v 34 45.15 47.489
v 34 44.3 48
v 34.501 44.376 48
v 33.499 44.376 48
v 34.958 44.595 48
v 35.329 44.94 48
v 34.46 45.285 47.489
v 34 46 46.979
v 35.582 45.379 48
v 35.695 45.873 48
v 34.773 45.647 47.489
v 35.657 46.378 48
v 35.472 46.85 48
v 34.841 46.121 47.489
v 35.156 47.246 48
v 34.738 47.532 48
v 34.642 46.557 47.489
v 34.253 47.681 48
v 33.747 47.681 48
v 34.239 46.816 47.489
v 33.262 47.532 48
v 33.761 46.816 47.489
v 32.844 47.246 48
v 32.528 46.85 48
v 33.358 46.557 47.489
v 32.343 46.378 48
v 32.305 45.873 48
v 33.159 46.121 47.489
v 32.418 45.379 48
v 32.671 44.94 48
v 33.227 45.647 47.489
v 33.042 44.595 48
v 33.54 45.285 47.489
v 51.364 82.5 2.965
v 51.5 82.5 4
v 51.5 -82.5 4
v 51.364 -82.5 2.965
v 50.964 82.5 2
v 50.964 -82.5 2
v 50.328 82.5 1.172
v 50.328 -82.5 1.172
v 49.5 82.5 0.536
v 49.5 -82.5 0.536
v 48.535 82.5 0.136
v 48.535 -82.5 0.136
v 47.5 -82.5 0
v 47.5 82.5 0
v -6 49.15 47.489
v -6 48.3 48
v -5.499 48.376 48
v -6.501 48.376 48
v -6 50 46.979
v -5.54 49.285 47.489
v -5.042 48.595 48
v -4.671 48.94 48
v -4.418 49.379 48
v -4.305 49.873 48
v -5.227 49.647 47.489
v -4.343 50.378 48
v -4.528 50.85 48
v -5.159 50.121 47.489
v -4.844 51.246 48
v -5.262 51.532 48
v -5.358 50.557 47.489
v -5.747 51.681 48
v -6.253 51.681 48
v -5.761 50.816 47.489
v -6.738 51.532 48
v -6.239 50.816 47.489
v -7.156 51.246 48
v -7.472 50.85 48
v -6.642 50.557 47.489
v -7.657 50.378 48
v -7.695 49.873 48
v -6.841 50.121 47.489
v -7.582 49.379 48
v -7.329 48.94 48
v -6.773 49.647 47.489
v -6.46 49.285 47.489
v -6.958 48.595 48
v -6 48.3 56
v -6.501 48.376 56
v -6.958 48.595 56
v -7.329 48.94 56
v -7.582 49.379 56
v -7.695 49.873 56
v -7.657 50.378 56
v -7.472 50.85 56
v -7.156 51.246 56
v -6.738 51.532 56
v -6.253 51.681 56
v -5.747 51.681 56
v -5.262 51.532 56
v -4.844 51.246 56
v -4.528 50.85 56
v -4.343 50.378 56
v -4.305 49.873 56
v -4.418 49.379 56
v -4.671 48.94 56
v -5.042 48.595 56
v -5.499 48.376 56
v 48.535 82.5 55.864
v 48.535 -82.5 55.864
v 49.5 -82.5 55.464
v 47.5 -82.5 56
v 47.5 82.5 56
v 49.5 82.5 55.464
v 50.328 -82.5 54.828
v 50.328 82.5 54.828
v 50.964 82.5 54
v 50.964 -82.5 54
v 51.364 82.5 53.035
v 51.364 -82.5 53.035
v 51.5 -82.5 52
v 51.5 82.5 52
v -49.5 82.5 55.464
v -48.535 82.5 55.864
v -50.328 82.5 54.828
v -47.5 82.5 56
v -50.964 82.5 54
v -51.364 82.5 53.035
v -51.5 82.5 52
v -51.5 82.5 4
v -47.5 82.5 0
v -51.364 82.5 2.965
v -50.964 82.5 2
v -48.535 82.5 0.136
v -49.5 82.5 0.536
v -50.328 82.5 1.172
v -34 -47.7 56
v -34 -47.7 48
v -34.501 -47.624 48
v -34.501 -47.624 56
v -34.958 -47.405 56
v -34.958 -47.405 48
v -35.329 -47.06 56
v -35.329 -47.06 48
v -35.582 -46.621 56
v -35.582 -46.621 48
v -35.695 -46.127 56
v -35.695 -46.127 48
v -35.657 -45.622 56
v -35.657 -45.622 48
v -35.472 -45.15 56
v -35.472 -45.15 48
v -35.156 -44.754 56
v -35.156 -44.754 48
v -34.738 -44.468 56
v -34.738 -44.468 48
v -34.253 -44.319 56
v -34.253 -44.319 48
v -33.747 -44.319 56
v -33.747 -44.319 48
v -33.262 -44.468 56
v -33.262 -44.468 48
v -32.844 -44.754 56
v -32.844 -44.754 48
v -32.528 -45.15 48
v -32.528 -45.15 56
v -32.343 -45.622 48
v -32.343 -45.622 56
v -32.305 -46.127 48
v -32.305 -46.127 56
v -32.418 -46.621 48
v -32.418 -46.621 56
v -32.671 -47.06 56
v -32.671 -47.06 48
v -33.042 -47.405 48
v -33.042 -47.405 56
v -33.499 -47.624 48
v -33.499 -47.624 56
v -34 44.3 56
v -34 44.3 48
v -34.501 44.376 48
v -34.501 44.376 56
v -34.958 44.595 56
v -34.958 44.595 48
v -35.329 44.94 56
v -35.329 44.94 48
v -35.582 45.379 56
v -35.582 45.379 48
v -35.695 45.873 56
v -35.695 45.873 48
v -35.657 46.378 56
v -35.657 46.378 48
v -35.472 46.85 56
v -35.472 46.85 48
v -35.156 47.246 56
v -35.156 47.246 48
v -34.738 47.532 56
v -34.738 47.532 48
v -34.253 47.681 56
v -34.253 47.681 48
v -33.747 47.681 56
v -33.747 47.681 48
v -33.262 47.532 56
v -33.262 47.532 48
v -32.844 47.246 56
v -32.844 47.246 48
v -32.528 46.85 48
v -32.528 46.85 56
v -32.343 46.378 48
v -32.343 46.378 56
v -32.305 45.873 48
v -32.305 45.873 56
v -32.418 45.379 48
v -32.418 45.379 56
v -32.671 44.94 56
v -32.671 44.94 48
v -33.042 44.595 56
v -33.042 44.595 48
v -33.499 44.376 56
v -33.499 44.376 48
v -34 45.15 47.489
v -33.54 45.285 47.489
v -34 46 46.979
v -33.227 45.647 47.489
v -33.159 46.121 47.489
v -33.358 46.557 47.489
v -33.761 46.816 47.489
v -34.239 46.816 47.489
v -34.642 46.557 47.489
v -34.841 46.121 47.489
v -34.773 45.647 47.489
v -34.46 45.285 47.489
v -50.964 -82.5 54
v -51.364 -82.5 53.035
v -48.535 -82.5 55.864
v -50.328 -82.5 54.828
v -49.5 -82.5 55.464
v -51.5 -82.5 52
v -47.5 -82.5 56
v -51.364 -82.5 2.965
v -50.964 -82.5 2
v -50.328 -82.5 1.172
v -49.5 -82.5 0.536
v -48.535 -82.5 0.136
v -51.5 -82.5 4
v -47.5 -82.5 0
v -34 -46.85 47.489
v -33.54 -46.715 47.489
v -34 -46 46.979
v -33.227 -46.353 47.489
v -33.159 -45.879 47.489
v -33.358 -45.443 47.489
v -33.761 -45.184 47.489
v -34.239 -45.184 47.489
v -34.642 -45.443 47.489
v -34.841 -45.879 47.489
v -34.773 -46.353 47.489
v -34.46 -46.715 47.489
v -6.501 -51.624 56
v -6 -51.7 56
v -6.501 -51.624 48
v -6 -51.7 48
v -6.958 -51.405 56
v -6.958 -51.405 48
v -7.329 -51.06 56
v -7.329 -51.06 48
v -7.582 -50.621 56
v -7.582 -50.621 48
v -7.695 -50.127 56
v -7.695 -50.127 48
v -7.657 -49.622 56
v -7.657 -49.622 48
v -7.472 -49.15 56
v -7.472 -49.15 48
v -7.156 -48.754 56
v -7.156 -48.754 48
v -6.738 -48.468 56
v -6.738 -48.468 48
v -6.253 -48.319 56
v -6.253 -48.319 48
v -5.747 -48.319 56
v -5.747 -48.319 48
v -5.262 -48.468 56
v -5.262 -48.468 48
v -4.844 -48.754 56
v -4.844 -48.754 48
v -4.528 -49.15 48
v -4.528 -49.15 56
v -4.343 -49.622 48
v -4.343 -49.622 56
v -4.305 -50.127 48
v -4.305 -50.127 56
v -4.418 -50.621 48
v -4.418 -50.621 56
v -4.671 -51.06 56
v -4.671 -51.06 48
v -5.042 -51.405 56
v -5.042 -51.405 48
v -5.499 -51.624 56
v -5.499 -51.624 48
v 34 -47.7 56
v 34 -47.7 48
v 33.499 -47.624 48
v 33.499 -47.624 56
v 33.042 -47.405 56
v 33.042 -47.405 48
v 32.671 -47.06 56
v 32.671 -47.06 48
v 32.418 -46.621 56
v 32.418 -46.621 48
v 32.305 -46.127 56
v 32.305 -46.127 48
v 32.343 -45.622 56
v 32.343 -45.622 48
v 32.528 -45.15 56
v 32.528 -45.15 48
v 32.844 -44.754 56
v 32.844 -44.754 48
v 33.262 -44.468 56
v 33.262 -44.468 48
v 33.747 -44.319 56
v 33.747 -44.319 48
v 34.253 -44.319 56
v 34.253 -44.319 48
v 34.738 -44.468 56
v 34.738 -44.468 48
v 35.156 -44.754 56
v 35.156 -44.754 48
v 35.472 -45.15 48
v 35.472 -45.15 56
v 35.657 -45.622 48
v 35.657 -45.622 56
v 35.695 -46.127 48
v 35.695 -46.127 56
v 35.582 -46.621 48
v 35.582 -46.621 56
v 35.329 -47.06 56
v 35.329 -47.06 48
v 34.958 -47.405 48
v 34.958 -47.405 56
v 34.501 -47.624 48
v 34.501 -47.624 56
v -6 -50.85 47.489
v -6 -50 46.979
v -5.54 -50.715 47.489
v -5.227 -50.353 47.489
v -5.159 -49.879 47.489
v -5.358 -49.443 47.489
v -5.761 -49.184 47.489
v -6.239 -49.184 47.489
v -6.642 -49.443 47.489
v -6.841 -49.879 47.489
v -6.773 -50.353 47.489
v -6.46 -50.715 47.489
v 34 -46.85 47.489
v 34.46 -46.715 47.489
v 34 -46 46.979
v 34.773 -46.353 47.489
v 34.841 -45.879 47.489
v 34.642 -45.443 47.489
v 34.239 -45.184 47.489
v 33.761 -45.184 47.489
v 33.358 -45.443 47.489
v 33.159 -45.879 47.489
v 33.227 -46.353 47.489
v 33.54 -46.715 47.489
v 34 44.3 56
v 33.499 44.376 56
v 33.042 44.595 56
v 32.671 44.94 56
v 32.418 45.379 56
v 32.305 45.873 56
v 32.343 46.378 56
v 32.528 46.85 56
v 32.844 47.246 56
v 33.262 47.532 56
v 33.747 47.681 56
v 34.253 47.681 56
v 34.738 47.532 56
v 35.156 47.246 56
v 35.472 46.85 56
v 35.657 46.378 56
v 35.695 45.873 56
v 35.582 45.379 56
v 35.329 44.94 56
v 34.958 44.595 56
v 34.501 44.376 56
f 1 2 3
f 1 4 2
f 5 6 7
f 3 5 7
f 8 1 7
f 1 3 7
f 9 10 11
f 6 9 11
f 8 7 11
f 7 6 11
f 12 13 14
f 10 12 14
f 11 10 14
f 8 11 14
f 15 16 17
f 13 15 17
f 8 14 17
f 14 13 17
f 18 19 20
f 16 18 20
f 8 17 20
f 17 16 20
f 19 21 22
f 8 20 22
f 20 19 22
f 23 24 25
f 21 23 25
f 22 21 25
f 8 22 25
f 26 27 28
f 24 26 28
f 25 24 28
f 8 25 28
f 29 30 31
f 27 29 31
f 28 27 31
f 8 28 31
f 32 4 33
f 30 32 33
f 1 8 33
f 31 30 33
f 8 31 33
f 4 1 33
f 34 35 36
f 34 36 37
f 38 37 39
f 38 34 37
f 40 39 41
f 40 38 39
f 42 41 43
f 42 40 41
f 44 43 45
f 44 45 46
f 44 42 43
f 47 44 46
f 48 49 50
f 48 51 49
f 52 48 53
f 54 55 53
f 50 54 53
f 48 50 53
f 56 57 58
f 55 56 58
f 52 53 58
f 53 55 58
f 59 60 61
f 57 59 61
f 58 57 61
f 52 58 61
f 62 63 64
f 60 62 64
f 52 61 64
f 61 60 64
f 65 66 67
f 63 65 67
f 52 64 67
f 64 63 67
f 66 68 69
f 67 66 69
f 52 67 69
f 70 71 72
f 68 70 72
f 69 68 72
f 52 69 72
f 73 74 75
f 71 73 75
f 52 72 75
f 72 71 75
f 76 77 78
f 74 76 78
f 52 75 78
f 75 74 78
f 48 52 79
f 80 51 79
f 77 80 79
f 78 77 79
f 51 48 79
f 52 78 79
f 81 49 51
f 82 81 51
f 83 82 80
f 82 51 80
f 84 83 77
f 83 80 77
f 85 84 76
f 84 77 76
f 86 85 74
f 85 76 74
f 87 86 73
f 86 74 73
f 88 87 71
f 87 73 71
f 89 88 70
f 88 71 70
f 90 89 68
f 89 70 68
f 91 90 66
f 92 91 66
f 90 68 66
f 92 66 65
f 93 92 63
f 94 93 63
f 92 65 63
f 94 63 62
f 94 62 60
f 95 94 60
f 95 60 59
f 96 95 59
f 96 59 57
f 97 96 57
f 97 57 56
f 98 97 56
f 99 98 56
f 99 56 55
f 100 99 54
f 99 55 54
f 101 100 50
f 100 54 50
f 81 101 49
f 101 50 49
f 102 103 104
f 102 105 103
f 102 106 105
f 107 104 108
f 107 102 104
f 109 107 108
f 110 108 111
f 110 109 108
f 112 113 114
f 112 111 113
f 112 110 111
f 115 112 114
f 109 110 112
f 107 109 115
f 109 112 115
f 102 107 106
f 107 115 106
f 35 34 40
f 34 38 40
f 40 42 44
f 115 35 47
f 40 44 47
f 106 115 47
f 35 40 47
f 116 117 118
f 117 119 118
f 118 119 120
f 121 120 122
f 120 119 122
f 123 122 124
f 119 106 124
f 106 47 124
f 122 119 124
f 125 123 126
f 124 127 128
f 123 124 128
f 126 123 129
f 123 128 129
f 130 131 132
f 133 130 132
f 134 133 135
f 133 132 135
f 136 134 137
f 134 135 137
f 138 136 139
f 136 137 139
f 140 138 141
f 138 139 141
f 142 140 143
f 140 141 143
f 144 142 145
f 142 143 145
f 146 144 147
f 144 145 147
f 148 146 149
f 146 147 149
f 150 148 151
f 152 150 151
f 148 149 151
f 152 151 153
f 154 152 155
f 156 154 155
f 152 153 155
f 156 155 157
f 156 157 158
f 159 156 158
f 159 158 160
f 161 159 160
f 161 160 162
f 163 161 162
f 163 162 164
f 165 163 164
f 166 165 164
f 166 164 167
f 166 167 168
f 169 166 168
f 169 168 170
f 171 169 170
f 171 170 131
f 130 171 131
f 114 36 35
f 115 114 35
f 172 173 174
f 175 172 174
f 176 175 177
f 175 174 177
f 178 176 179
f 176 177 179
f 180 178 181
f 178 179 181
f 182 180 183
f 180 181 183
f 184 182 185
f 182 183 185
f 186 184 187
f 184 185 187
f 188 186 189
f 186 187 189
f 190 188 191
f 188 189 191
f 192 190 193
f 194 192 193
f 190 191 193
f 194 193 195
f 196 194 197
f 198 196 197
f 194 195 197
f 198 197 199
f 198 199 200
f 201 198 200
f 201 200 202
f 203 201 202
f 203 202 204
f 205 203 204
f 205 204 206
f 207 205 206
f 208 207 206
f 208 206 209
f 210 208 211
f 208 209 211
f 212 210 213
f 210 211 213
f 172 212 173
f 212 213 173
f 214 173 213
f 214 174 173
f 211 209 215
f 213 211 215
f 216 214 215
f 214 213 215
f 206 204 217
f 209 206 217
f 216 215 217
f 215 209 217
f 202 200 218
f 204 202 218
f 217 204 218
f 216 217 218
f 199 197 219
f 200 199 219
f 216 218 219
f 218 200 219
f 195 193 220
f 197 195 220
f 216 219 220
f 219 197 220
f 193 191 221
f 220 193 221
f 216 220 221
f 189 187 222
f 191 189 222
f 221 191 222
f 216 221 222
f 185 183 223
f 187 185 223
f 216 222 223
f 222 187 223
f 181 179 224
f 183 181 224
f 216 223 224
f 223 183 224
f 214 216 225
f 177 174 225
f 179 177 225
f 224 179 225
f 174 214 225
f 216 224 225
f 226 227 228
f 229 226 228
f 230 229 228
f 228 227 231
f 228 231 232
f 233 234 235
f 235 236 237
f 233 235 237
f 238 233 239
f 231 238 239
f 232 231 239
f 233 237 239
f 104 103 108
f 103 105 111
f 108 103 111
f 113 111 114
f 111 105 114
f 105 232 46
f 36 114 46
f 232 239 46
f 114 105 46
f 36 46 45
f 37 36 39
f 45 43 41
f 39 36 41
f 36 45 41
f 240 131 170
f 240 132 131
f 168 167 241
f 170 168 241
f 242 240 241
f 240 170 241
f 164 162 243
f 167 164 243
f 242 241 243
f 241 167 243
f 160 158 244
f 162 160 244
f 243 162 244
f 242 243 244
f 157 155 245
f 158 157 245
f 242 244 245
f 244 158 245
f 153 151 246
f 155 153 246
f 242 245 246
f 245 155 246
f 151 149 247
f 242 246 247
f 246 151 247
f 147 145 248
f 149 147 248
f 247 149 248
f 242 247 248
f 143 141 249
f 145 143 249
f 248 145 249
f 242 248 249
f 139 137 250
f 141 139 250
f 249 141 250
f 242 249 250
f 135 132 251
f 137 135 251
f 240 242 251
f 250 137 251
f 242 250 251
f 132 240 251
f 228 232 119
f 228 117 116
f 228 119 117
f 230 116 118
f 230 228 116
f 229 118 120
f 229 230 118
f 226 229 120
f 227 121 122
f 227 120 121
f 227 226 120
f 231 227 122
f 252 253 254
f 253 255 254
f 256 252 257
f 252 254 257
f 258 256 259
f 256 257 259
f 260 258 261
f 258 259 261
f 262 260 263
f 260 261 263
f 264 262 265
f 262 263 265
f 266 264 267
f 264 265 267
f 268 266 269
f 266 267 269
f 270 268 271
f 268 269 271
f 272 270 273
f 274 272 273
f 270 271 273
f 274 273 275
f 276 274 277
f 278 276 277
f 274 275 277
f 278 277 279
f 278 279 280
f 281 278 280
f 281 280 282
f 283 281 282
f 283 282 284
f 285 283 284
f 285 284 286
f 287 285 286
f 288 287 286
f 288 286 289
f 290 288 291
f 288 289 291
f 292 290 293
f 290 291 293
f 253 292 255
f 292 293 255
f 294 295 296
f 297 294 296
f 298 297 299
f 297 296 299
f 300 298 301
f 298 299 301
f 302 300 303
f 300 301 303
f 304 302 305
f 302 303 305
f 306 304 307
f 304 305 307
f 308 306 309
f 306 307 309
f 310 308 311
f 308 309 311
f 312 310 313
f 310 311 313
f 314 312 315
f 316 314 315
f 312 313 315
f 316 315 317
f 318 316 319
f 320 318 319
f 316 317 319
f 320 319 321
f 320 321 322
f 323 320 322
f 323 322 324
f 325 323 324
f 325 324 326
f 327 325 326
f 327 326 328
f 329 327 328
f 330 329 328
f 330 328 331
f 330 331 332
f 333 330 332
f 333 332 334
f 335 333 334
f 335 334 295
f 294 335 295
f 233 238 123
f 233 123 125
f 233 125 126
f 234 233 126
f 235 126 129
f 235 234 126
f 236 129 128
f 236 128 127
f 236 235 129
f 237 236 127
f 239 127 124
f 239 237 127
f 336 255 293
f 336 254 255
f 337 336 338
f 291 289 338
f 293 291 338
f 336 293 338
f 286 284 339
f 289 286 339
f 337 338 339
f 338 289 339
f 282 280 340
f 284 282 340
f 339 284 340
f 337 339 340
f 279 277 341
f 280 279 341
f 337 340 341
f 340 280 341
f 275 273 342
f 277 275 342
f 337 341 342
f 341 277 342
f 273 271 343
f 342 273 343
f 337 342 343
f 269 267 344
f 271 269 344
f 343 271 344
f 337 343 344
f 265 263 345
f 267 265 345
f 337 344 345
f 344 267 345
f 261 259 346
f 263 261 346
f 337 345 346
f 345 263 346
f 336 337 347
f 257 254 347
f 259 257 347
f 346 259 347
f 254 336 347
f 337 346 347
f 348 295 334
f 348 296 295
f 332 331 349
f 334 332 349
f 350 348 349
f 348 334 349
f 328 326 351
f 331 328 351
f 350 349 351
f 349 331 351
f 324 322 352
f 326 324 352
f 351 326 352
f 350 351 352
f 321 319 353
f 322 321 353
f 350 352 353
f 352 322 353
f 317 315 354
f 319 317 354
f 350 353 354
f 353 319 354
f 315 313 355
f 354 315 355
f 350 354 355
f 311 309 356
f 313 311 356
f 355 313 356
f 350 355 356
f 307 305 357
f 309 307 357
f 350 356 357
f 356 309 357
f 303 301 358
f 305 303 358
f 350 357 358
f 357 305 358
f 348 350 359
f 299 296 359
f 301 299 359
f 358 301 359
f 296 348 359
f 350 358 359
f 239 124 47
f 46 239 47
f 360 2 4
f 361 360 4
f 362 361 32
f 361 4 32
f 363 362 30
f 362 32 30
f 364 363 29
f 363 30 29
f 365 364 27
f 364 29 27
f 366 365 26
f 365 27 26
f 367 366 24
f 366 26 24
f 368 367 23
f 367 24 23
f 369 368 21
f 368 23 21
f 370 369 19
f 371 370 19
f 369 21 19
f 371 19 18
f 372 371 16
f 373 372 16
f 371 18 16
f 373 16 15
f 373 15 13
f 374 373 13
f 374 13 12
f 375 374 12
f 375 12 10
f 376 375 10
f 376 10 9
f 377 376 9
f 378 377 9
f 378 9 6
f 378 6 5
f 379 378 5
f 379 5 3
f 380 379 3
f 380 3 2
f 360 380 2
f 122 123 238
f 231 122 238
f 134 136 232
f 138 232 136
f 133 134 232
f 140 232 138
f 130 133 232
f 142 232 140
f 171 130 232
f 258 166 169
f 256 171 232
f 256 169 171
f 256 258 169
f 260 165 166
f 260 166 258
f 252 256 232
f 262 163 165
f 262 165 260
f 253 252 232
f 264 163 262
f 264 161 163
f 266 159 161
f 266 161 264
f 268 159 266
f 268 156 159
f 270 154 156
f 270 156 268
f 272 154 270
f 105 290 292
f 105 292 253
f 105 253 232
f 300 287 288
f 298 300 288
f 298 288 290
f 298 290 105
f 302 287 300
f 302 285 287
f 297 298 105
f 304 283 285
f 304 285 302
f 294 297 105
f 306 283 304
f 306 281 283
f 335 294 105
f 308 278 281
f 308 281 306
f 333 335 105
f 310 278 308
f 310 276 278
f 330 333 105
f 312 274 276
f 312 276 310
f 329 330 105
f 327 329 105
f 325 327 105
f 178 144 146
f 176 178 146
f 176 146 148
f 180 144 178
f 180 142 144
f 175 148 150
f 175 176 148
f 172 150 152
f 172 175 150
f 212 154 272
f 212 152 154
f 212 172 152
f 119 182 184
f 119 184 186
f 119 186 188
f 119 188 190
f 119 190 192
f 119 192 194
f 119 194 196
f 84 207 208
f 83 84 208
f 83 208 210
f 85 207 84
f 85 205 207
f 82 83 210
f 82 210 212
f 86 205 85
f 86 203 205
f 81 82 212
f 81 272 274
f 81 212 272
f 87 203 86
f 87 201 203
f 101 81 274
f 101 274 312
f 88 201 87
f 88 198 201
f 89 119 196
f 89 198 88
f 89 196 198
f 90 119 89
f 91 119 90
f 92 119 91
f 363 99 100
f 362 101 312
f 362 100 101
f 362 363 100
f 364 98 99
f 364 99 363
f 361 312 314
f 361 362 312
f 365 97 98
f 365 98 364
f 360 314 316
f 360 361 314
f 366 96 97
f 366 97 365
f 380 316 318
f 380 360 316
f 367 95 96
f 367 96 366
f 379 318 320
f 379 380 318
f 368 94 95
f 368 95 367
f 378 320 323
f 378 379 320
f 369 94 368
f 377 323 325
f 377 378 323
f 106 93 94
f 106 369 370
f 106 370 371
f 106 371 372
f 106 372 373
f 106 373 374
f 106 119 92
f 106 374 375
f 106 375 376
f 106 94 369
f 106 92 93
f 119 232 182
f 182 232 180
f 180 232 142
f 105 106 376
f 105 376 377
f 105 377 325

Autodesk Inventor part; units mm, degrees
ref_plane "YZ Plane" through (0, 0, 0) normal (1, 0, 0) x (0, 1, 0)
ref_plane "XZ Plane" through (0, 0, 0) normal (0, 1, 0) x (-1, 0, 0)
ref_plane "XY Plane" through (0, 0, 0) normal (0, 0, 1) x (1, 0, 0)
sketch "Sketch1" plane through (0, 0, 0) normal (0, 0, 1) x (1, 0, 0)
  line L0 (-51.5, -82.5) -> (51.5, -82.5)
  line L1 (51.5, -82.5) -> (51.5, 82.5)
  line L2 (51.5, 82.5) -> (-51.5, 82.5)
  line L3 (-51.5, 82.5) -> (-51.5, -82.5)
  line L4 (-51.5, -82.5) -> (51.5, 82.5) construction
  line L5 (51.5, -82.5) -> (-51.5, 82.5) construction
  point P0 (0, 0)
  dimension "d0" = 103
  dimension "d1" = 165
extrude "Extrusion1" add sketch "Sketch1" along normal blind 56
fillet "Fillet1" radius 4 4 edges at (-51.5, 0, 56) (51.5, 0, 56) (51.5, 0, 0) (-51.5, 0, 0)
sketch "Sketch2" plane through (0, 0, 56) normal (0, 0, 1) x (1, 0, 0)
  line L0 (-6, 50) -> (-6, -50) construction
  line L1 (-51.5, 82.5) -> (-51.5, -82.5) projected
  line L2 (51.5, -82.5) -> (51.5, 82.5) projected
  point P0 (0, 0)
  point P1 (-6, 0)
  dimension "d14" = 100
  dimension "d26" = 57.5
hole "Hole1" at (-6, -50, 56) at (-6, 50, 56) direction (0, 0, -1) diameter 3.4 depth 8 tip angle 118 clearance for "Countersunk Flat Head Screw DIN EN ISO 2009" size "M3" standard "DIN"
sketch "Sketch3" plane through (0, 0, 56) normal (0, 0, 1) x (1, 0, 0)
  line L0 (-34, -46) -> (34, -46) construction
  line L1 (34, -46) -> (34, 46) construction
  line L2 (34, 46) -> (-34, 46) construction
  line L3 (-34, 46) -> (-34, -46) construction
  line L4 (-47.5, -82.5) -> (47.5, -82.5) construction
  line L5 (-47.5, -82.5) -> (-47.5, 82.5) projected
  point P0 (0, 0)
  point P1 (0, -46)
  point P2 (-34, 0)
  point P3 (-47.5, 0)
  dimension "d16" = 92
  dimension "d17" = 68
hole "Hole2" at (-34, -46, 56) at (-34, 46, 56) at (34, 46, 56) at (34, -46, 56) direction (0, 0, -1) diameter 3.4 depth 8 tip angle 118 clearance for "Countersunk Flat Head Screw DIN EN ISO 2009" size "M3" standard "DIN"
properties part number "Elektronik_Gehäuse" material "Aluminum 6061"
